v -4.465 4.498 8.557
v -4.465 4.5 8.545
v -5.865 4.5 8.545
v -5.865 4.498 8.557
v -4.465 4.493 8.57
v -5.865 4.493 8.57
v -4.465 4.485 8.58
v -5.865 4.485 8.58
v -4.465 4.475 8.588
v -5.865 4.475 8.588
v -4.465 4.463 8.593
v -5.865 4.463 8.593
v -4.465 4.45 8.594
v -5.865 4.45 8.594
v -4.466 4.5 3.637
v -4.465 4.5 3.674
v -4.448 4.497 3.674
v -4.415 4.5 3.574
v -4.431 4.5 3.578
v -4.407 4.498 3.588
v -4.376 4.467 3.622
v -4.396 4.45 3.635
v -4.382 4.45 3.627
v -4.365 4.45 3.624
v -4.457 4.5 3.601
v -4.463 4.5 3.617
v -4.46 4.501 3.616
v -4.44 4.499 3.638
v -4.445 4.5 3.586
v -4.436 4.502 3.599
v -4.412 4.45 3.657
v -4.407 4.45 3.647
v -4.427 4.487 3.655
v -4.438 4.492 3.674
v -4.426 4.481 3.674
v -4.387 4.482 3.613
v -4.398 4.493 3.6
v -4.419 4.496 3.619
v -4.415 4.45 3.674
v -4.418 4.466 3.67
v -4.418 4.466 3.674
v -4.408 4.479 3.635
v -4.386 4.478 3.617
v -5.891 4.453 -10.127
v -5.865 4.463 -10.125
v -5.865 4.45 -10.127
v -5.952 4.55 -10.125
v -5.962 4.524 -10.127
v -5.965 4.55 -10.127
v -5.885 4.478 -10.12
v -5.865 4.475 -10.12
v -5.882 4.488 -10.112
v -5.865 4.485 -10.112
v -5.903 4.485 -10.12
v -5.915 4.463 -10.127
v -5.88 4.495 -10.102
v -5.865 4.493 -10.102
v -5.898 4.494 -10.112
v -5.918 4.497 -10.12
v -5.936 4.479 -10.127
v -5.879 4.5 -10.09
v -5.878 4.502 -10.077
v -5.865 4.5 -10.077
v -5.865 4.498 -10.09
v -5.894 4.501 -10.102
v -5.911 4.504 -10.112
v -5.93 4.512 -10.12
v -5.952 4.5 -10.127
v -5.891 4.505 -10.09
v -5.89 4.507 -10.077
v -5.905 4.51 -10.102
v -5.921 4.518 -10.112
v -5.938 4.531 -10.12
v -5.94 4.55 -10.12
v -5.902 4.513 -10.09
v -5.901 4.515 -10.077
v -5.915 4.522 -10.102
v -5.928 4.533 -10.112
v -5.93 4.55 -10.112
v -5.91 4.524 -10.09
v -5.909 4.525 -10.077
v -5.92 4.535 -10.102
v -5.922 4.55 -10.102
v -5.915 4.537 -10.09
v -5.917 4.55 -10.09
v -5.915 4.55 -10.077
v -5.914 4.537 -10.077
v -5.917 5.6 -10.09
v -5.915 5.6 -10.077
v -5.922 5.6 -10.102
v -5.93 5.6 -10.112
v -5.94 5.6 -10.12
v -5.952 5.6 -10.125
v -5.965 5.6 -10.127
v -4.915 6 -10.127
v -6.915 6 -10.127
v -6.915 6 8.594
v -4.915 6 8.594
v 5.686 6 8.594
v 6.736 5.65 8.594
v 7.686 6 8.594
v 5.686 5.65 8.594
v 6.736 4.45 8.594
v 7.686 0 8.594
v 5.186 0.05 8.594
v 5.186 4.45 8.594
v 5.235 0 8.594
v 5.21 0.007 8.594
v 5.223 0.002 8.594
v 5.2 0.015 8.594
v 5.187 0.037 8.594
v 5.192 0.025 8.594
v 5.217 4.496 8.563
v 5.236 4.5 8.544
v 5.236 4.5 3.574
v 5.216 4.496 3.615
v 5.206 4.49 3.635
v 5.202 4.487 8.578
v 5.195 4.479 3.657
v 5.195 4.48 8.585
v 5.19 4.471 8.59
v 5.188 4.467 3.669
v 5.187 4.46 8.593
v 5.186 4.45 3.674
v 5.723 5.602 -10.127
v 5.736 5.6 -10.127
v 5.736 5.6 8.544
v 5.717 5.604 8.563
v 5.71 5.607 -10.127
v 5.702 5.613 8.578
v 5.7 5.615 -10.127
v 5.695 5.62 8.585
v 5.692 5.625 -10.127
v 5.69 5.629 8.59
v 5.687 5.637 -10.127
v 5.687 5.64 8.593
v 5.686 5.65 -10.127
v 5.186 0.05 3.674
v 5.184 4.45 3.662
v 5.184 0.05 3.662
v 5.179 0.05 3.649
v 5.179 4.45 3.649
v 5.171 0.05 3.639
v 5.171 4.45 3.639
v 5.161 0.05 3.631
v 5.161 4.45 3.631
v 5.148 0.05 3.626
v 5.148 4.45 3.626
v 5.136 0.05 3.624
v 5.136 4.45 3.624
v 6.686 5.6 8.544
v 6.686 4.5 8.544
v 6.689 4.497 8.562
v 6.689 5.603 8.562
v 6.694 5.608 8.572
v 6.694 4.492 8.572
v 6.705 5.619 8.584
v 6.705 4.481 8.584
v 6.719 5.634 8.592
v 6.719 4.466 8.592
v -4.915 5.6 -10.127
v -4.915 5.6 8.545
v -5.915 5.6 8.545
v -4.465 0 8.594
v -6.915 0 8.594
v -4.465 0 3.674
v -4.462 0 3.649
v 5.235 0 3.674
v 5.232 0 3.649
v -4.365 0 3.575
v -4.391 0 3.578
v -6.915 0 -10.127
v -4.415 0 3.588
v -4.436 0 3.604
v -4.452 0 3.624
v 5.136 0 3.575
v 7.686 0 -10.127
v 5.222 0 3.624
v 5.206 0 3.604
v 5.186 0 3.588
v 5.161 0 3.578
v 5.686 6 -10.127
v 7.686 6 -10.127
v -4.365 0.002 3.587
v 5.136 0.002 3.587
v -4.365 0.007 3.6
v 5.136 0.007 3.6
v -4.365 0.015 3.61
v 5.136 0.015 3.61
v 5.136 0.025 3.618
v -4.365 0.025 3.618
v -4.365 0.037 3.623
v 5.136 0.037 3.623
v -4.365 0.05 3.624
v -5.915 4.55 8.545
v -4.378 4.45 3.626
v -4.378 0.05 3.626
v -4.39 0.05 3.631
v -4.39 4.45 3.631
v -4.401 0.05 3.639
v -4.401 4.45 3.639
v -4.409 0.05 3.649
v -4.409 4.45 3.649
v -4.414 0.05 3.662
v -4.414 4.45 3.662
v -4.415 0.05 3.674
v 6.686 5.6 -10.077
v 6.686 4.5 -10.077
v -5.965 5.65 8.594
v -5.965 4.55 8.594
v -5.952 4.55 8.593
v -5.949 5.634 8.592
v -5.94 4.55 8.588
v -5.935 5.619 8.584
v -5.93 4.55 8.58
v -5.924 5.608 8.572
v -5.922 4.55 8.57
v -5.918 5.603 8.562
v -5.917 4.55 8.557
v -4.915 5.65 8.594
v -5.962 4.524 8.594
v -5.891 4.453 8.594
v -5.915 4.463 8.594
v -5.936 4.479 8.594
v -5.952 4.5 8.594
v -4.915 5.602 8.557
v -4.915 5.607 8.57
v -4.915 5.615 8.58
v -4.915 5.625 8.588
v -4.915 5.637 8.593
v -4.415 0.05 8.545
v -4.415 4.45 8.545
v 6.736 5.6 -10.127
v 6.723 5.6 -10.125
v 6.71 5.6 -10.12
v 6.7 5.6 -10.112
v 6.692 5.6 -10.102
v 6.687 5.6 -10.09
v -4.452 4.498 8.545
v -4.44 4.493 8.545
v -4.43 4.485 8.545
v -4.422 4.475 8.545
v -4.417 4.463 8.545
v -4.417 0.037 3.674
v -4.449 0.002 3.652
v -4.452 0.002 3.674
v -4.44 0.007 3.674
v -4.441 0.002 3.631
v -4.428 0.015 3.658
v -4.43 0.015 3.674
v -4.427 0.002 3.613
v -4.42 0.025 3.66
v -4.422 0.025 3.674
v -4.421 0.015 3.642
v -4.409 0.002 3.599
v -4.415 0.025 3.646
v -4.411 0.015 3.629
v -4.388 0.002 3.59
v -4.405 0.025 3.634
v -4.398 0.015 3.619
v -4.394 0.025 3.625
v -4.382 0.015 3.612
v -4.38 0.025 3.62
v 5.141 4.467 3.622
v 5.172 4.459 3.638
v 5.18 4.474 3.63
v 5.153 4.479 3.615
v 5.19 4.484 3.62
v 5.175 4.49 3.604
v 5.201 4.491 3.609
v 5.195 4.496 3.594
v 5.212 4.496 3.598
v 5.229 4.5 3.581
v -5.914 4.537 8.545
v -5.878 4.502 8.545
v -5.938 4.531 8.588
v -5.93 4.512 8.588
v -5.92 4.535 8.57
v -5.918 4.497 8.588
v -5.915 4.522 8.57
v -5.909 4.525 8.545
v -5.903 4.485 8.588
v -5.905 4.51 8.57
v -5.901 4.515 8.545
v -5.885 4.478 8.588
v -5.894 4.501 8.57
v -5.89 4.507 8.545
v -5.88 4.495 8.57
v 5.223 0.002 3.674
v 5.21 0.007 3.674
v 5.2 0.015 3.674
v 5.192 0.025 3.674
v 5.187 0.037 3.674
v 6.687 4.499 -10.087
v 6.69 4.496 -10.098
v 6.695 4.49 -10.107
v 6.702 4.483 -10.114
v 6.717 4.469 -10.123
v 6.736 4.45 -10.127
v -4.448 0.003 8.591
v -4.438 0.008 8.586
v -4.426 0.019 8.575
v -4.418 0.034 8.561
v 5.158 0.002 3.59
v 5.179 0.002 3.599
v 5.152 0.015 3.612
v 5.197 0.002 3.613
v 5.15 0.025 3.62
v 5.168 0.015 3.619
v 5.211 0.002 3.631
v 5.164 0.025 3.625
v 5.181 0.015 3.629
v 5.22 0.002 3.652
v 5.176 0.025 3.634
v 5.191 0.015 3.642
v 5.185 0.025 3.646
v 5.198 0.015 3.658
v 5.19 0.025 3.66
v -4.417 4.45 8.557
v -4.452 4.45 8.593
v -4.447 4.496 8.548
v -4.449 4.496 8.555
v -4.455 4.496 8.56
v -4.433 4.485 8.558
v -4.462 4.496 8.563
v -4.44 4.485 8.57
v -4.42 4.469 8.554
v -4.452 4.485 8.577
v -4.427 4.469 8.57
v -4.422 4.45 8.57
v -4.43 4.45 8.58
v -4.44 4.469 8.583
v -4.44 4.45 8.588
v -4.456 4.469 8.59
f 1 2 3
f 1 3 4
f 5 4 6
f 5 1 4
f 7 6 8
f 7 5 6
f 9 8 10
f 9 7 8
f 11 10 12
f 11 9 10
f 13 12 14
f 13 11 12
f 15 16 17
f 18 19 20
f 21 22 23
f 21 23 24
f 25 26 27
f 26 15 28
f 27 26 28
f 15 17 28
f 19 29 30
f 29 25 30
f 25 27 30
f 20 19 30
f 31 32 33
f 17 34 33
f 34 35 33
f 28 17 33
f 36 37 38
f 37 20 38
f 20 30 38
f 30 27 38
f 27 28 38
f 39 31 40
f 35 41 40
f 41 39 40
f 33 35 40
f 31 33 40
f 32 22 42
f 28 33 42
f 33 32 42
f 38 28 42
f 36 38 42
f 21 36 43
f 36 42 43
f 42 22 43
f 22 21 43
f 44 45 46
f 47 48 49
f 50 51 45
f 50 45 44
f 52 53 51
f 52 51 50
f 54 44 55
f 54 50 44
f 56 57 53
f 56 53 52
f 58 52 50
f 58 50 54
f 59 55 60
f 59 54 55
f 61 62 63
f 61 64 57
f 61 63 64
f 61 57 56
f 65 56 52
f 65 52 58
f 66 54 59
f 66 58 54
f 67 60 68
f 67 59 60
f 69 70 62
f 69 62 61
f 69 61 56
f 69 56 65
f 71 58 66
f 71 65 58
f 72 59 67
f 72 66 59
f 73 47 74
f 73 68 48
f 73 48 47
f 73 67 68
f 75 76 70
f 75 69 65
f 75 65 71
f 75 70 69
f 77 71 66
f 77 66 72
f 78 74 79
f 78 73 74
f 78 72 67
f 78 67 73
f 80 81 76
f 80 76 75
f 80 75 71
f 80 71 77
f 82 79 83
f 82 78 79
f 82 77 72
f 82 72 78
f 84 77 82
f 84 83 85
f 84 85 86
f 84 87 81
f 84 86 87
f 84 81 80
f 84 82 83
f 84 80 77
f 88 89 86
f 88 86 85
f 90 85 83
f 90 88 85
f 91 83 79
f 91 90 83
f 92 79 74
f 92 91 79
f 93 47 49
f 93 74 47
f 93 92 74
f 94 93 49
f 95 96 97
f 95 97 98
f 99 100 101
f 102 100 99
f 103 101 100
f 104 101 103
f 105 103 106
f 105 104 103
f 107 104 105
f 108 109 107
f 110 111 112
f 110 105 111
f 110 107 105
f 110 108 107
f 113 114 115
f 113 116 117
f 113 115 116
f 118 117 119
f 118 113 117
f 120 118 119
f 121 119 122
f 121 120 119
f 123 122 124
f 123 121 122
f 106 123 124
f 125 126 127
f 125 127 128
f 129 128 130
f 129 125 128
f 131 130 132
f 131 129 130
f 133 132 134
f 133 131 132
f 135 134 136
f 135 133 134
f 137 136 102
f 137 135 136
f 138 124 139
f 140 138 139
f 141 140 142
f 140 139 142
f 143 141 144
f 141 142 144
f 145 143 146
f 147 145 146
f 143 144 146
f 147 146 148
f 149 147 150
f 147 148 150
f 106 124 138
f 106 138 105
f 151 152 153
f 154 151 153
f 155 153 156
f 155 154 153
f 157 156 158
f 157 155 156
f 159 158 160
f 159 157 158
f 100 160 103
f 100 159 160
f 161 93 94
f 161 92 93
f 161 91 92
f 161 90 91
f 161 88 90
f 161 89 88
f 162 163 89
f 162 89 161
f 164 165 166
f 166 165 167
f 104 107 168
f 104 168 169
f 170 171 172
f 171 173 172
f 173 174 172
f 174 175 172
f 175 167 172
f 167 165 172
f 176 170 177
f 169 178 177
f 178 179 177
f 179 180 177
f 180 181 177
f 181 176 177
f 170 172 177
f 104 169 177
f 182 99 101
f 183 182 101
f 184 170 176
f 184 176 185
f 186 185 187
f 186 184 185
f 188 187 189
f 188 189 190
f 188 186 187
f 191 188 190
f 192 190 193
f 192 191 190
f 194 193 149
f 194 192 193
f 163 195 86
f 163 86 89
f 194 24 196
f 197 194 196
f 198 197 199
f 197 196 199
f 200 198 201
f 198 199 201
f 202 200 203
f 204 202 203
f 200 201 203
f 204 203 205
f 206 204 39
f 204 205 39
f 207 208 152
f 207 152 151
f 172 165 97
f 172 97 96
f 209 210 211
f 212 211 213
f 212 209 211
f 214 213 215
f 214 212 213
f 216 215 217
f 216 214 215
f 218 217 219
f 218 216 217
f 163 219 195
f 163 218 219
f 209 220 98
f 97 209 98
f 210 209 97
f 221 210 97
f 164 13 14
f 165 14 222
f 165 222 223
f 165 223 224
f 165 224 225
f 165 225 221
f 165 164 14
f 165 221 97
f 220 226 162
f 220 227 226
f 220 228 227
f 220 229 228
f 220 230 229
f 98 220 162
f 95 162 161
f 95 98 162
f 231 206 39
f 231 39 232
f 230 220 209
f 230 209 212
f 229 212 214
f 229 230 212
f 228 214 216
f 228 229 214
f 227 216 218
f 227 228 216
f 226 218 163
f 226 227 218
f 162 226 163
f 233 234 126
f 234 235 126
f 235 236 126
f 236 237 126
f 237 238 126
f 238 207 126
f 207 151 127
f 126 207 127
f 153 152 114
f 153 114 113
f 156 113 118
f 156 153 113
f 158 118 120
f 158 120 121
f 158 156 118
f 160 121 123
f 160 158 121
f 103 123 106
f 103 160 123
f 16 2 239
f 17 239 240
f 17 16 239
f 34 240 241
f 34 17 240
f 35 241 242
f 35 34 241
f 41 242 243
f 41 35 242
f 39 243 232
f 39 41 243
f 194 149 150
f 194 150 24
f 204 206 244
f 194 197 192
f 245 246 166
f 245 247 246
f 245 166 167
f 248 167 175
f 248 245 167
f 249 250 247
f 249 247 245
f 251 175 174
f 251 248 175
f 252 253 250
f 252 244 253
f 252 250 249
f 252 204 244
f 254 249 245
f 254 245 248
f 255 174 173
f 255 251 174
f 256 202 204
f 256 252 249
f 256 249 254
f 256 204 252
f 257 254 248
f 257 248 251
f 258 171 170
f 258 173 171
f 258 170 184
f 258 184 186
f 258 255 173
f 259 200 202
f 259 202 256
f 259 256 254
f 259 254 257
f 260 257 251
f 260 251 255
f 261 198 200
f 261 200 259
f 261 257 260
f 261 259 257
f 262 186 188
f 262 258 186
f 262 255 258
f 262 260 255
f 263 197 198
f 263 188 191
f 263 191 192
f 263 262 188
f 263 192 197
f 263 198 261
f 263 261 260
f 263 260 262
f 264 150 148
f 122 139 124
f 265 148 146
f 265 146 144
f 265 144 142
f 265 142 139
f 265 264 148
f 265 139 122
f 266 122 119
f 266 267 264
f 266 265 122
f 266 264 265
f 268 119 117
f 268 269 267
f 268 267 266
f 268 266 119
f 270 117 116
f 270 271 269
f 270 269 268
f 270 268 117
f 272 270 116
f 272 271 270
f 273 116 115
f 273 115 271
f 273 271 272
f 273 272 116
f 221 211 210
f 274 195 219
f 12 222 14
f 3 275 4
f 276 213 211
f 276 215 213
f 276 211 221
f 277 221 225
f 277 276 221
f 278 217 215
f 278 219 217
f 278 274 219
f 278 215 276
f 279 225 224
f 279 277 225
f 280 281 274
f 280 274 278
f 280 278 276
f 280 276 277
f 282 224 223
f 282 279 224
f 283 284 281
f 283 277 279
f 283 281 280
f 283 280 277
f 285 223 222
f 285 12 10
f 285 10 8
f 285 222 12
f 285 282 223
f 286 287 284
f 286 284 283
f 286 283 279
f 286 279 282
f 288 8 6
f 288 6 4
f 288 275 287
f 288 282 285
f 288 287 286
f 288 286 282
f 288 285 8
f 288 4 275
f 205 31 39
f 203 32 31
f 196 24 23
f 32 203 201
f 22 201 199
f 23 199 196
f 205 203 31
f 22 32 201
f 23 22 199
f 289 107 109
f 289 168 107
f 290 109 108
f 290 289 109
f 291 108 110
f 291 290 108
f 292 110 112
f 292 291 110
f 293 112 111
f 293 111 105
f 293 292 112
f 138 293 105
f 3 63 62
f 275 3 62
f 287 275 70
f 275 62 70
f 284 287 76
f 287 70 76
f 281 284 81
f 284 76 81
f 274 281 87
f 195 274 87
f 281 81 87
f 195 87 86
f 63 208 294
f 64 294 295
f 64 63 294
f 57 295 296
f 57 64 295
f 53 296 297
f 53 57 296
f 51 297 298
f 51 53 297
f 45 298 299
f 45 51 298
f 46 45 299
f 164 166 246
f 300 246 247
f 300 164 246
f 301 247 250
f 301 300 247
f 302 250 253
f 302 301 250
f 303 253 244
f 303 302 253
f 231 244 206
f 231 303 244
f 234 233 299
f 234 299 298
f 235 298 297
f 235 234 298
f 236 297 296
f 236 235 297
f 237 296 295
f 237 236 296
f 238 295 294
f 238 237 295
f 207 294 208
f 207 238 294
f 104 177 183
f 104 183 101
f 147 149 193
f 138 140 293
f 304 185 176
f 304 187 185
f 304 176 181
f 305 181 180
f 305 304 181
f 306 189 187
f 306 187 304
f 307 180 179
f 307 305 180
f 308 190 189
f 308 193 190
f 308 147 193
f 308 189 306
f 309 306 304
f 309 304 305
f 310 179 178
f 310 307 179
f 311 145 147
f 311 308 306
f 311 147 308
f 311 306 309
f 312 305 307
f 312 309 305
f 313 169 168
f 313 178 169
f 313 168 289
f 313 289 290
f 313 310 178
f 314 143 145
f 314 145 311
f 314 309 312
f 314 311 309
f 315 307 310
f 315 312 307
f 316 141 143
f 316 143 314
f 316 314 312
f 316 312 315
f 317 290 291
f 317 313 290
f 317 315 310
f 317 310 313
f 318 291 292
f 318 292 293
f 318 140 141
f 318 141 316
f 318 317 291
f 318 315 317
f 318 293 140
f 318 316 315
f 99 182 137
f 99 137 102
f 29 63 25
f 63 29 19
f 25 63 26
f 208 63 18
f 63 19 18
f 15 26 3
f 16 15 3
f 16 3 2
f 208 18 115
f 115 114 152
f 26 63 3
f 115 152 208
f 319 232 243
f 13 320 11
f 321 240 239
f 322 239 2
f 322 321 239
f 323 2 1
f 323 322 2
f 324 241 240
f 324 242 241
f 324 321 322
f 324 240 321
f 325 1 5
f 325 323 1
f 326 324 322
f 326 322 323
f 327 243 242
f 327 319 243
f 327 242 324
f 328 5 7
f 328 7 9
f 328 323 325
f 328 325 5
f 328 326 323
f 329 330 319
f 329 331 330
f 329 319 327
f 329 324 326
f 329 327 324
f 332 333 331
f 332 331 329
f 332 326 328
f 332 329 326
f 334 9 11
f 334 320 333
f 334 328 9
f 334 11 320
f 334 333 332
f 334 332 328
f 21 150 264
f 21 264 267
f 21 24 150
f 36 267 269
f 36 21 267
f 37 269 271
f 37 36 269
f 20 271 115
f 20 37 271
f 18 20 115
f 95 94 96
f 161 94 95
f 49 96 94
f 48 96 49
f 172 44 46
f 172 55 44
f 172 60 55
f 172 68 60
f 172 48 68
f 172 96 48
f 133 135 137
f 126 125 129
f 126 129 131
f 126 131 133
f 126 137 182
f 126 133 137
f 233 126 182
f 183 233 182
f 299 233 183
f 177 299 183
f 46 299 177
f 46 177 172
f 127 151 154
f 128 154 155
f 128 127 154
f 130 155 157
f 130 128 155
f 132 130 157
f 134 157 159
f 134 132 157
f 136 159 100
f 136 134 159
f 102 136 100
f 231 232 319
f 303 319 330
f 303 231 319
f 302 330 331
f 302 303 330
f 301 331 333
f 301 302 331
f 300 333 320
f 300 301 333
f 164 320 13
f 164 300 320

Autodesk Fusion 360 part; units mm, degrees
sketch "Sketch1" plane through (0, 0, 0) normal (0, 1, 0) x (1, 0, 0)
  line L0 (-6.9154, 10.127) -> (7.6855, 10.127)
  line L1 (7.6855, 10.127) -> (7.6855, -8.5945)
  line L2 (7.6855, -8.5945) -> (-6.9154, -8.5945)
  line L3 (-6.9154, -8.5945) -> (-6.9154, 10.127)
extrude "Extrude1" add sketch "Sketch1" along normal blind 6
sketch "Sketch2" plane through (0, 0, 0) normal (0, -1, 0) x (1, 0, 0)
  line L0 (7.6855, 8.5945) -> (-6.9154, 8.5945)
  line L1 (-6.9154, 8.5945) -> (-6.9154, -10.127)
  line L2 (-6.9154, -10.127) -> (7.6855, -10.127)
  line L3 (7.6855, -10.127) -> (7.6855, 8.5945)
  line L4 (-6.9154, 8.5945) -> (-4.4154, 8.5945)
  line L5 (7.6855, 8.5945) -> (5.1855, 8.5945)
  line L6 (-4.4154, 8.5945) -> (-4.4154, 7.6945)
  line L7 (5.1855, 8.5945) -> (5.1855, 7.6945)
  line L8 (5.1855, 7.6945) -> (5.1855, 3.6245)
  line L9 (-4.4154, 7.6945) -> (5.1855, 7.6945)
  line L10 (5.1855, 7.6945) -> (5.1855, 3.6245)
  line L11 (5.1855, 3.6245) -> (-4.4154, 3.6245)
  line L12 (-4.4154, 3.6245) -> (-4.4154, 7.6945)
  dimension "d3" = 2.5
  dimension "d4" = 2.5
  dimension "d5" = 0.9
  dimension "d6" = 0.9
  dimension "d7" = 4.07
extrude "Extrude2" cut sketch "Sketch2" against normal blind 4.5 contours L8 L9 L10 L11 L12
sketch "Sketch3" plane through (-6.9154, 0, 0) normal (-1, 0, 0) x (0, 0, 1)
  line L0 (-10.127, 0) -> (8.5945, 0)
  line L1 (8.5945, 0) -> (8.5945, 6)
  line L2 (8.5945, 6) -> (-10.127, 6)
  line L3 (-10.127, 6) -> (-10.127, 0)
  line L4 (8.5945, 0) -> (3.6345, 0)
  line L5 (8.5945, 0) -> (7.6945, 0)
  line L6 (7.6945, 0) -> (7.6945, 4.5)
  line L7 (3.6345, 0) -> (3.6245, 4.5)
  dimension "d10" = 4.96
  dimension "d11" = 0.9
  dimension "d12" = 4.5
sketch "Sketch4" plane through (0, 6, 0) normal (0, 1, 0) x (-1, 0, 0)
  line L0 (6.9154, 8.5945) -> (-7.6855, 8.5945)
  line L1 (-7.6855, 8.5945) -> (-7.6855, -10.127)
  line L2 (-7.6855, -10.127) -> (6.9154, -10.127)
  line L3 (6.9154, -10.127) -> (6.9154, 8.5945)
  line L4 (6.9154, 8.5945) -> (4.9154, 8.5945)
  line L5 (-7.6855, 8.5945) -> (-5.6855, 8.5945)
  line L6 (6.9154, -10.127) -> (4.9154, -10.127)
  line L7 (-7.6855, -10.127) -> (-5.6855, -10.127)
  line L8 (4.9154, -10.127) -> (-5.6855, -10.127)
  line L9 (-5.6855, -10.127) -> (-5.6855, 8.5945)
  line L10 (-5.6855, 8.5945) -> (4.9154, 8.5945)
  line L11 (4.9154, 8.5945) -> (4.9154, -10.127)
  dimension "d13" = 2
  dimension "d14" = 2
  dimension "d15" = 2
  dimension "d16" = 2
extrude "Extrude3" cut sketch "Sketch4" against normal up to surface (1.5 mm away) contours L0 L2 L8 L9 L10 L11
sketch "Sketch5" plane through (0, 0, 8.5945) normal (0, 0, 1) x (1, 0, 0)
  line L0 (-4.9154, 4.5) -> (-4.9154, 6)
  line L1 (-4.9154, 6) -> (-6.9154, 6)
  line L2 (-6.9154, 6) -> (-6.9154, 0)
  line L3 (-6.9154, 0) -> (7.6855, 0)
  line L4 (7.6855, 0) -> (7.6855, 6)
  line L5 (7.6855, 6) -> (5.6855, 6)
  line L6 (5.6855, 6) -> (5.6855, 4.5)
  line L7 (5.6855, 4.5) -> (-4.9154, 4.5)
  line L8 (-4.9154, 4.5) -> (-5.9154, 4.5)
  line L9 (5.6855, 4.5) -> (6.6855, 4.5)
  line L10 (-5.9154, 4.5) -> (-5.9154, 5.6)
  line L11 (6.6855, 4.5) -> (6.6855, 5.6)
  line L12 (-4.9154, 4.5) -> (-5.9154, 4.5)
  line L13 (-5.9154, 4.5) -> (-5.9154, 5.6)
  line L14 (-5.9154, 5.6) -> (-4.9154, 5.6)
  line L15 (-4.9154, 5.6) -> (-4.9154, 4.5)
  line L16 (5.6855, 4.5) -> (6.6855, 4.5)
  line L17 (6.6855, 4.5) -> (6.6855, 5.6)
  line L18 (6.6855, 5.6) -> (5.6855, 5.6)
  line L19 (5.6855, 5.6) -> (5.6855, 4.5)
  dimension "d19" = 1
  dimension "d20" = 1
  dimension "d21" = 1.1
  dimension "d22" = 1.1
extrude "Extrude5" cut sketch "Sketch5" against normal up to surface (18.7215 mm away) contours L6 L9 L11 L16 L17 L18 L19
extrude "Extrude4" cut sketch "Sketch5" against normal up to surface (18.7215 mm away) contours L0 L8 L10 L12 L13 L14 L15
sketch "Sketch6" plane through (0, 4.5, 0) normal (0, 1, 0) x (-1, 0, 0)
  line L0 (-5.1855, 3.6245) -> (-5.1855, 7.6945)
  line L1 (-5.1855, 7.6945) -> (4.4154, 7.6945)
  line L2 (4.4154, 7.6945) -> (4.4154, 3.6245)
  line L3 (4.4154, 3.6245) -> (-5.1855, 3.6245)
  line L4 (-6.6855, -10.127) -> (5.9154, -10.127)
  line L5 (5.9154, -10.127) -> (5.9154, 8.5945)
  line L6 (5.9154, 8.5945) -> (-6.6855, 8.5945)
  line L7 (-6.6855, 8.5945) -> (-6.6855, -10.127)
  line L8 (4.4154, 7.6945) -> (-5.1855, 7.6945)
  line L9 (-5.1855, 7.6945) -> (-5.1855, 8.5945)
  line L10 (-5.1855, 8.5945) -> (4.4154, 8.5945)
  line L11 (4.4154, 8.5945) -> (4.4154, 7.6945)
extrude "Extrude6" cut sketch "Sketch6" against normal up to surface (4.5 mm away) contours L1 L6 L8 L9 L10 L11
fillet "Fillet1" radius 0.05 6 edges at (5.6855, 5.6, -0.7662) (6.1855, 5.6, 8.5945) (6.6855, 5.05, 8.5945) (5.9355, 4.5, 8.5945) (5.1855, 4.5, 6.1095) (0.3851, 4.5, 3.6245)
fillet "Fillet2" radius 0.05 13 edges at (-4.4154, 2.225, 3.6245) (-4.4154, 4.4854, 3.6099) (-4.4154, 2.25, 8.5945) (0.3851, 0, 3.6245) (5.1855, 2.225, 3.6245) (5.2001, 4.4854, 3.6099) (5.1855, 0, 6.1095) (-4.4154, 0, 6.1095) (-4.4154, 4.5, 6.0845) (-5.1654, 4.5, 8.5945) (-5.9154, 5.05, 8.5945) (-5.4154, 5.6, 8.5945) (-5.9154, 4.5, -0.7662)
fillet "Fillet3" radius 0.05 4 edges at (6.6855, 5.05, -10.127) (-5.9154, 5.075, -10.127) (-5.9007, 4.5146, -10.127) (0.4101, 4.5, -10.127)
